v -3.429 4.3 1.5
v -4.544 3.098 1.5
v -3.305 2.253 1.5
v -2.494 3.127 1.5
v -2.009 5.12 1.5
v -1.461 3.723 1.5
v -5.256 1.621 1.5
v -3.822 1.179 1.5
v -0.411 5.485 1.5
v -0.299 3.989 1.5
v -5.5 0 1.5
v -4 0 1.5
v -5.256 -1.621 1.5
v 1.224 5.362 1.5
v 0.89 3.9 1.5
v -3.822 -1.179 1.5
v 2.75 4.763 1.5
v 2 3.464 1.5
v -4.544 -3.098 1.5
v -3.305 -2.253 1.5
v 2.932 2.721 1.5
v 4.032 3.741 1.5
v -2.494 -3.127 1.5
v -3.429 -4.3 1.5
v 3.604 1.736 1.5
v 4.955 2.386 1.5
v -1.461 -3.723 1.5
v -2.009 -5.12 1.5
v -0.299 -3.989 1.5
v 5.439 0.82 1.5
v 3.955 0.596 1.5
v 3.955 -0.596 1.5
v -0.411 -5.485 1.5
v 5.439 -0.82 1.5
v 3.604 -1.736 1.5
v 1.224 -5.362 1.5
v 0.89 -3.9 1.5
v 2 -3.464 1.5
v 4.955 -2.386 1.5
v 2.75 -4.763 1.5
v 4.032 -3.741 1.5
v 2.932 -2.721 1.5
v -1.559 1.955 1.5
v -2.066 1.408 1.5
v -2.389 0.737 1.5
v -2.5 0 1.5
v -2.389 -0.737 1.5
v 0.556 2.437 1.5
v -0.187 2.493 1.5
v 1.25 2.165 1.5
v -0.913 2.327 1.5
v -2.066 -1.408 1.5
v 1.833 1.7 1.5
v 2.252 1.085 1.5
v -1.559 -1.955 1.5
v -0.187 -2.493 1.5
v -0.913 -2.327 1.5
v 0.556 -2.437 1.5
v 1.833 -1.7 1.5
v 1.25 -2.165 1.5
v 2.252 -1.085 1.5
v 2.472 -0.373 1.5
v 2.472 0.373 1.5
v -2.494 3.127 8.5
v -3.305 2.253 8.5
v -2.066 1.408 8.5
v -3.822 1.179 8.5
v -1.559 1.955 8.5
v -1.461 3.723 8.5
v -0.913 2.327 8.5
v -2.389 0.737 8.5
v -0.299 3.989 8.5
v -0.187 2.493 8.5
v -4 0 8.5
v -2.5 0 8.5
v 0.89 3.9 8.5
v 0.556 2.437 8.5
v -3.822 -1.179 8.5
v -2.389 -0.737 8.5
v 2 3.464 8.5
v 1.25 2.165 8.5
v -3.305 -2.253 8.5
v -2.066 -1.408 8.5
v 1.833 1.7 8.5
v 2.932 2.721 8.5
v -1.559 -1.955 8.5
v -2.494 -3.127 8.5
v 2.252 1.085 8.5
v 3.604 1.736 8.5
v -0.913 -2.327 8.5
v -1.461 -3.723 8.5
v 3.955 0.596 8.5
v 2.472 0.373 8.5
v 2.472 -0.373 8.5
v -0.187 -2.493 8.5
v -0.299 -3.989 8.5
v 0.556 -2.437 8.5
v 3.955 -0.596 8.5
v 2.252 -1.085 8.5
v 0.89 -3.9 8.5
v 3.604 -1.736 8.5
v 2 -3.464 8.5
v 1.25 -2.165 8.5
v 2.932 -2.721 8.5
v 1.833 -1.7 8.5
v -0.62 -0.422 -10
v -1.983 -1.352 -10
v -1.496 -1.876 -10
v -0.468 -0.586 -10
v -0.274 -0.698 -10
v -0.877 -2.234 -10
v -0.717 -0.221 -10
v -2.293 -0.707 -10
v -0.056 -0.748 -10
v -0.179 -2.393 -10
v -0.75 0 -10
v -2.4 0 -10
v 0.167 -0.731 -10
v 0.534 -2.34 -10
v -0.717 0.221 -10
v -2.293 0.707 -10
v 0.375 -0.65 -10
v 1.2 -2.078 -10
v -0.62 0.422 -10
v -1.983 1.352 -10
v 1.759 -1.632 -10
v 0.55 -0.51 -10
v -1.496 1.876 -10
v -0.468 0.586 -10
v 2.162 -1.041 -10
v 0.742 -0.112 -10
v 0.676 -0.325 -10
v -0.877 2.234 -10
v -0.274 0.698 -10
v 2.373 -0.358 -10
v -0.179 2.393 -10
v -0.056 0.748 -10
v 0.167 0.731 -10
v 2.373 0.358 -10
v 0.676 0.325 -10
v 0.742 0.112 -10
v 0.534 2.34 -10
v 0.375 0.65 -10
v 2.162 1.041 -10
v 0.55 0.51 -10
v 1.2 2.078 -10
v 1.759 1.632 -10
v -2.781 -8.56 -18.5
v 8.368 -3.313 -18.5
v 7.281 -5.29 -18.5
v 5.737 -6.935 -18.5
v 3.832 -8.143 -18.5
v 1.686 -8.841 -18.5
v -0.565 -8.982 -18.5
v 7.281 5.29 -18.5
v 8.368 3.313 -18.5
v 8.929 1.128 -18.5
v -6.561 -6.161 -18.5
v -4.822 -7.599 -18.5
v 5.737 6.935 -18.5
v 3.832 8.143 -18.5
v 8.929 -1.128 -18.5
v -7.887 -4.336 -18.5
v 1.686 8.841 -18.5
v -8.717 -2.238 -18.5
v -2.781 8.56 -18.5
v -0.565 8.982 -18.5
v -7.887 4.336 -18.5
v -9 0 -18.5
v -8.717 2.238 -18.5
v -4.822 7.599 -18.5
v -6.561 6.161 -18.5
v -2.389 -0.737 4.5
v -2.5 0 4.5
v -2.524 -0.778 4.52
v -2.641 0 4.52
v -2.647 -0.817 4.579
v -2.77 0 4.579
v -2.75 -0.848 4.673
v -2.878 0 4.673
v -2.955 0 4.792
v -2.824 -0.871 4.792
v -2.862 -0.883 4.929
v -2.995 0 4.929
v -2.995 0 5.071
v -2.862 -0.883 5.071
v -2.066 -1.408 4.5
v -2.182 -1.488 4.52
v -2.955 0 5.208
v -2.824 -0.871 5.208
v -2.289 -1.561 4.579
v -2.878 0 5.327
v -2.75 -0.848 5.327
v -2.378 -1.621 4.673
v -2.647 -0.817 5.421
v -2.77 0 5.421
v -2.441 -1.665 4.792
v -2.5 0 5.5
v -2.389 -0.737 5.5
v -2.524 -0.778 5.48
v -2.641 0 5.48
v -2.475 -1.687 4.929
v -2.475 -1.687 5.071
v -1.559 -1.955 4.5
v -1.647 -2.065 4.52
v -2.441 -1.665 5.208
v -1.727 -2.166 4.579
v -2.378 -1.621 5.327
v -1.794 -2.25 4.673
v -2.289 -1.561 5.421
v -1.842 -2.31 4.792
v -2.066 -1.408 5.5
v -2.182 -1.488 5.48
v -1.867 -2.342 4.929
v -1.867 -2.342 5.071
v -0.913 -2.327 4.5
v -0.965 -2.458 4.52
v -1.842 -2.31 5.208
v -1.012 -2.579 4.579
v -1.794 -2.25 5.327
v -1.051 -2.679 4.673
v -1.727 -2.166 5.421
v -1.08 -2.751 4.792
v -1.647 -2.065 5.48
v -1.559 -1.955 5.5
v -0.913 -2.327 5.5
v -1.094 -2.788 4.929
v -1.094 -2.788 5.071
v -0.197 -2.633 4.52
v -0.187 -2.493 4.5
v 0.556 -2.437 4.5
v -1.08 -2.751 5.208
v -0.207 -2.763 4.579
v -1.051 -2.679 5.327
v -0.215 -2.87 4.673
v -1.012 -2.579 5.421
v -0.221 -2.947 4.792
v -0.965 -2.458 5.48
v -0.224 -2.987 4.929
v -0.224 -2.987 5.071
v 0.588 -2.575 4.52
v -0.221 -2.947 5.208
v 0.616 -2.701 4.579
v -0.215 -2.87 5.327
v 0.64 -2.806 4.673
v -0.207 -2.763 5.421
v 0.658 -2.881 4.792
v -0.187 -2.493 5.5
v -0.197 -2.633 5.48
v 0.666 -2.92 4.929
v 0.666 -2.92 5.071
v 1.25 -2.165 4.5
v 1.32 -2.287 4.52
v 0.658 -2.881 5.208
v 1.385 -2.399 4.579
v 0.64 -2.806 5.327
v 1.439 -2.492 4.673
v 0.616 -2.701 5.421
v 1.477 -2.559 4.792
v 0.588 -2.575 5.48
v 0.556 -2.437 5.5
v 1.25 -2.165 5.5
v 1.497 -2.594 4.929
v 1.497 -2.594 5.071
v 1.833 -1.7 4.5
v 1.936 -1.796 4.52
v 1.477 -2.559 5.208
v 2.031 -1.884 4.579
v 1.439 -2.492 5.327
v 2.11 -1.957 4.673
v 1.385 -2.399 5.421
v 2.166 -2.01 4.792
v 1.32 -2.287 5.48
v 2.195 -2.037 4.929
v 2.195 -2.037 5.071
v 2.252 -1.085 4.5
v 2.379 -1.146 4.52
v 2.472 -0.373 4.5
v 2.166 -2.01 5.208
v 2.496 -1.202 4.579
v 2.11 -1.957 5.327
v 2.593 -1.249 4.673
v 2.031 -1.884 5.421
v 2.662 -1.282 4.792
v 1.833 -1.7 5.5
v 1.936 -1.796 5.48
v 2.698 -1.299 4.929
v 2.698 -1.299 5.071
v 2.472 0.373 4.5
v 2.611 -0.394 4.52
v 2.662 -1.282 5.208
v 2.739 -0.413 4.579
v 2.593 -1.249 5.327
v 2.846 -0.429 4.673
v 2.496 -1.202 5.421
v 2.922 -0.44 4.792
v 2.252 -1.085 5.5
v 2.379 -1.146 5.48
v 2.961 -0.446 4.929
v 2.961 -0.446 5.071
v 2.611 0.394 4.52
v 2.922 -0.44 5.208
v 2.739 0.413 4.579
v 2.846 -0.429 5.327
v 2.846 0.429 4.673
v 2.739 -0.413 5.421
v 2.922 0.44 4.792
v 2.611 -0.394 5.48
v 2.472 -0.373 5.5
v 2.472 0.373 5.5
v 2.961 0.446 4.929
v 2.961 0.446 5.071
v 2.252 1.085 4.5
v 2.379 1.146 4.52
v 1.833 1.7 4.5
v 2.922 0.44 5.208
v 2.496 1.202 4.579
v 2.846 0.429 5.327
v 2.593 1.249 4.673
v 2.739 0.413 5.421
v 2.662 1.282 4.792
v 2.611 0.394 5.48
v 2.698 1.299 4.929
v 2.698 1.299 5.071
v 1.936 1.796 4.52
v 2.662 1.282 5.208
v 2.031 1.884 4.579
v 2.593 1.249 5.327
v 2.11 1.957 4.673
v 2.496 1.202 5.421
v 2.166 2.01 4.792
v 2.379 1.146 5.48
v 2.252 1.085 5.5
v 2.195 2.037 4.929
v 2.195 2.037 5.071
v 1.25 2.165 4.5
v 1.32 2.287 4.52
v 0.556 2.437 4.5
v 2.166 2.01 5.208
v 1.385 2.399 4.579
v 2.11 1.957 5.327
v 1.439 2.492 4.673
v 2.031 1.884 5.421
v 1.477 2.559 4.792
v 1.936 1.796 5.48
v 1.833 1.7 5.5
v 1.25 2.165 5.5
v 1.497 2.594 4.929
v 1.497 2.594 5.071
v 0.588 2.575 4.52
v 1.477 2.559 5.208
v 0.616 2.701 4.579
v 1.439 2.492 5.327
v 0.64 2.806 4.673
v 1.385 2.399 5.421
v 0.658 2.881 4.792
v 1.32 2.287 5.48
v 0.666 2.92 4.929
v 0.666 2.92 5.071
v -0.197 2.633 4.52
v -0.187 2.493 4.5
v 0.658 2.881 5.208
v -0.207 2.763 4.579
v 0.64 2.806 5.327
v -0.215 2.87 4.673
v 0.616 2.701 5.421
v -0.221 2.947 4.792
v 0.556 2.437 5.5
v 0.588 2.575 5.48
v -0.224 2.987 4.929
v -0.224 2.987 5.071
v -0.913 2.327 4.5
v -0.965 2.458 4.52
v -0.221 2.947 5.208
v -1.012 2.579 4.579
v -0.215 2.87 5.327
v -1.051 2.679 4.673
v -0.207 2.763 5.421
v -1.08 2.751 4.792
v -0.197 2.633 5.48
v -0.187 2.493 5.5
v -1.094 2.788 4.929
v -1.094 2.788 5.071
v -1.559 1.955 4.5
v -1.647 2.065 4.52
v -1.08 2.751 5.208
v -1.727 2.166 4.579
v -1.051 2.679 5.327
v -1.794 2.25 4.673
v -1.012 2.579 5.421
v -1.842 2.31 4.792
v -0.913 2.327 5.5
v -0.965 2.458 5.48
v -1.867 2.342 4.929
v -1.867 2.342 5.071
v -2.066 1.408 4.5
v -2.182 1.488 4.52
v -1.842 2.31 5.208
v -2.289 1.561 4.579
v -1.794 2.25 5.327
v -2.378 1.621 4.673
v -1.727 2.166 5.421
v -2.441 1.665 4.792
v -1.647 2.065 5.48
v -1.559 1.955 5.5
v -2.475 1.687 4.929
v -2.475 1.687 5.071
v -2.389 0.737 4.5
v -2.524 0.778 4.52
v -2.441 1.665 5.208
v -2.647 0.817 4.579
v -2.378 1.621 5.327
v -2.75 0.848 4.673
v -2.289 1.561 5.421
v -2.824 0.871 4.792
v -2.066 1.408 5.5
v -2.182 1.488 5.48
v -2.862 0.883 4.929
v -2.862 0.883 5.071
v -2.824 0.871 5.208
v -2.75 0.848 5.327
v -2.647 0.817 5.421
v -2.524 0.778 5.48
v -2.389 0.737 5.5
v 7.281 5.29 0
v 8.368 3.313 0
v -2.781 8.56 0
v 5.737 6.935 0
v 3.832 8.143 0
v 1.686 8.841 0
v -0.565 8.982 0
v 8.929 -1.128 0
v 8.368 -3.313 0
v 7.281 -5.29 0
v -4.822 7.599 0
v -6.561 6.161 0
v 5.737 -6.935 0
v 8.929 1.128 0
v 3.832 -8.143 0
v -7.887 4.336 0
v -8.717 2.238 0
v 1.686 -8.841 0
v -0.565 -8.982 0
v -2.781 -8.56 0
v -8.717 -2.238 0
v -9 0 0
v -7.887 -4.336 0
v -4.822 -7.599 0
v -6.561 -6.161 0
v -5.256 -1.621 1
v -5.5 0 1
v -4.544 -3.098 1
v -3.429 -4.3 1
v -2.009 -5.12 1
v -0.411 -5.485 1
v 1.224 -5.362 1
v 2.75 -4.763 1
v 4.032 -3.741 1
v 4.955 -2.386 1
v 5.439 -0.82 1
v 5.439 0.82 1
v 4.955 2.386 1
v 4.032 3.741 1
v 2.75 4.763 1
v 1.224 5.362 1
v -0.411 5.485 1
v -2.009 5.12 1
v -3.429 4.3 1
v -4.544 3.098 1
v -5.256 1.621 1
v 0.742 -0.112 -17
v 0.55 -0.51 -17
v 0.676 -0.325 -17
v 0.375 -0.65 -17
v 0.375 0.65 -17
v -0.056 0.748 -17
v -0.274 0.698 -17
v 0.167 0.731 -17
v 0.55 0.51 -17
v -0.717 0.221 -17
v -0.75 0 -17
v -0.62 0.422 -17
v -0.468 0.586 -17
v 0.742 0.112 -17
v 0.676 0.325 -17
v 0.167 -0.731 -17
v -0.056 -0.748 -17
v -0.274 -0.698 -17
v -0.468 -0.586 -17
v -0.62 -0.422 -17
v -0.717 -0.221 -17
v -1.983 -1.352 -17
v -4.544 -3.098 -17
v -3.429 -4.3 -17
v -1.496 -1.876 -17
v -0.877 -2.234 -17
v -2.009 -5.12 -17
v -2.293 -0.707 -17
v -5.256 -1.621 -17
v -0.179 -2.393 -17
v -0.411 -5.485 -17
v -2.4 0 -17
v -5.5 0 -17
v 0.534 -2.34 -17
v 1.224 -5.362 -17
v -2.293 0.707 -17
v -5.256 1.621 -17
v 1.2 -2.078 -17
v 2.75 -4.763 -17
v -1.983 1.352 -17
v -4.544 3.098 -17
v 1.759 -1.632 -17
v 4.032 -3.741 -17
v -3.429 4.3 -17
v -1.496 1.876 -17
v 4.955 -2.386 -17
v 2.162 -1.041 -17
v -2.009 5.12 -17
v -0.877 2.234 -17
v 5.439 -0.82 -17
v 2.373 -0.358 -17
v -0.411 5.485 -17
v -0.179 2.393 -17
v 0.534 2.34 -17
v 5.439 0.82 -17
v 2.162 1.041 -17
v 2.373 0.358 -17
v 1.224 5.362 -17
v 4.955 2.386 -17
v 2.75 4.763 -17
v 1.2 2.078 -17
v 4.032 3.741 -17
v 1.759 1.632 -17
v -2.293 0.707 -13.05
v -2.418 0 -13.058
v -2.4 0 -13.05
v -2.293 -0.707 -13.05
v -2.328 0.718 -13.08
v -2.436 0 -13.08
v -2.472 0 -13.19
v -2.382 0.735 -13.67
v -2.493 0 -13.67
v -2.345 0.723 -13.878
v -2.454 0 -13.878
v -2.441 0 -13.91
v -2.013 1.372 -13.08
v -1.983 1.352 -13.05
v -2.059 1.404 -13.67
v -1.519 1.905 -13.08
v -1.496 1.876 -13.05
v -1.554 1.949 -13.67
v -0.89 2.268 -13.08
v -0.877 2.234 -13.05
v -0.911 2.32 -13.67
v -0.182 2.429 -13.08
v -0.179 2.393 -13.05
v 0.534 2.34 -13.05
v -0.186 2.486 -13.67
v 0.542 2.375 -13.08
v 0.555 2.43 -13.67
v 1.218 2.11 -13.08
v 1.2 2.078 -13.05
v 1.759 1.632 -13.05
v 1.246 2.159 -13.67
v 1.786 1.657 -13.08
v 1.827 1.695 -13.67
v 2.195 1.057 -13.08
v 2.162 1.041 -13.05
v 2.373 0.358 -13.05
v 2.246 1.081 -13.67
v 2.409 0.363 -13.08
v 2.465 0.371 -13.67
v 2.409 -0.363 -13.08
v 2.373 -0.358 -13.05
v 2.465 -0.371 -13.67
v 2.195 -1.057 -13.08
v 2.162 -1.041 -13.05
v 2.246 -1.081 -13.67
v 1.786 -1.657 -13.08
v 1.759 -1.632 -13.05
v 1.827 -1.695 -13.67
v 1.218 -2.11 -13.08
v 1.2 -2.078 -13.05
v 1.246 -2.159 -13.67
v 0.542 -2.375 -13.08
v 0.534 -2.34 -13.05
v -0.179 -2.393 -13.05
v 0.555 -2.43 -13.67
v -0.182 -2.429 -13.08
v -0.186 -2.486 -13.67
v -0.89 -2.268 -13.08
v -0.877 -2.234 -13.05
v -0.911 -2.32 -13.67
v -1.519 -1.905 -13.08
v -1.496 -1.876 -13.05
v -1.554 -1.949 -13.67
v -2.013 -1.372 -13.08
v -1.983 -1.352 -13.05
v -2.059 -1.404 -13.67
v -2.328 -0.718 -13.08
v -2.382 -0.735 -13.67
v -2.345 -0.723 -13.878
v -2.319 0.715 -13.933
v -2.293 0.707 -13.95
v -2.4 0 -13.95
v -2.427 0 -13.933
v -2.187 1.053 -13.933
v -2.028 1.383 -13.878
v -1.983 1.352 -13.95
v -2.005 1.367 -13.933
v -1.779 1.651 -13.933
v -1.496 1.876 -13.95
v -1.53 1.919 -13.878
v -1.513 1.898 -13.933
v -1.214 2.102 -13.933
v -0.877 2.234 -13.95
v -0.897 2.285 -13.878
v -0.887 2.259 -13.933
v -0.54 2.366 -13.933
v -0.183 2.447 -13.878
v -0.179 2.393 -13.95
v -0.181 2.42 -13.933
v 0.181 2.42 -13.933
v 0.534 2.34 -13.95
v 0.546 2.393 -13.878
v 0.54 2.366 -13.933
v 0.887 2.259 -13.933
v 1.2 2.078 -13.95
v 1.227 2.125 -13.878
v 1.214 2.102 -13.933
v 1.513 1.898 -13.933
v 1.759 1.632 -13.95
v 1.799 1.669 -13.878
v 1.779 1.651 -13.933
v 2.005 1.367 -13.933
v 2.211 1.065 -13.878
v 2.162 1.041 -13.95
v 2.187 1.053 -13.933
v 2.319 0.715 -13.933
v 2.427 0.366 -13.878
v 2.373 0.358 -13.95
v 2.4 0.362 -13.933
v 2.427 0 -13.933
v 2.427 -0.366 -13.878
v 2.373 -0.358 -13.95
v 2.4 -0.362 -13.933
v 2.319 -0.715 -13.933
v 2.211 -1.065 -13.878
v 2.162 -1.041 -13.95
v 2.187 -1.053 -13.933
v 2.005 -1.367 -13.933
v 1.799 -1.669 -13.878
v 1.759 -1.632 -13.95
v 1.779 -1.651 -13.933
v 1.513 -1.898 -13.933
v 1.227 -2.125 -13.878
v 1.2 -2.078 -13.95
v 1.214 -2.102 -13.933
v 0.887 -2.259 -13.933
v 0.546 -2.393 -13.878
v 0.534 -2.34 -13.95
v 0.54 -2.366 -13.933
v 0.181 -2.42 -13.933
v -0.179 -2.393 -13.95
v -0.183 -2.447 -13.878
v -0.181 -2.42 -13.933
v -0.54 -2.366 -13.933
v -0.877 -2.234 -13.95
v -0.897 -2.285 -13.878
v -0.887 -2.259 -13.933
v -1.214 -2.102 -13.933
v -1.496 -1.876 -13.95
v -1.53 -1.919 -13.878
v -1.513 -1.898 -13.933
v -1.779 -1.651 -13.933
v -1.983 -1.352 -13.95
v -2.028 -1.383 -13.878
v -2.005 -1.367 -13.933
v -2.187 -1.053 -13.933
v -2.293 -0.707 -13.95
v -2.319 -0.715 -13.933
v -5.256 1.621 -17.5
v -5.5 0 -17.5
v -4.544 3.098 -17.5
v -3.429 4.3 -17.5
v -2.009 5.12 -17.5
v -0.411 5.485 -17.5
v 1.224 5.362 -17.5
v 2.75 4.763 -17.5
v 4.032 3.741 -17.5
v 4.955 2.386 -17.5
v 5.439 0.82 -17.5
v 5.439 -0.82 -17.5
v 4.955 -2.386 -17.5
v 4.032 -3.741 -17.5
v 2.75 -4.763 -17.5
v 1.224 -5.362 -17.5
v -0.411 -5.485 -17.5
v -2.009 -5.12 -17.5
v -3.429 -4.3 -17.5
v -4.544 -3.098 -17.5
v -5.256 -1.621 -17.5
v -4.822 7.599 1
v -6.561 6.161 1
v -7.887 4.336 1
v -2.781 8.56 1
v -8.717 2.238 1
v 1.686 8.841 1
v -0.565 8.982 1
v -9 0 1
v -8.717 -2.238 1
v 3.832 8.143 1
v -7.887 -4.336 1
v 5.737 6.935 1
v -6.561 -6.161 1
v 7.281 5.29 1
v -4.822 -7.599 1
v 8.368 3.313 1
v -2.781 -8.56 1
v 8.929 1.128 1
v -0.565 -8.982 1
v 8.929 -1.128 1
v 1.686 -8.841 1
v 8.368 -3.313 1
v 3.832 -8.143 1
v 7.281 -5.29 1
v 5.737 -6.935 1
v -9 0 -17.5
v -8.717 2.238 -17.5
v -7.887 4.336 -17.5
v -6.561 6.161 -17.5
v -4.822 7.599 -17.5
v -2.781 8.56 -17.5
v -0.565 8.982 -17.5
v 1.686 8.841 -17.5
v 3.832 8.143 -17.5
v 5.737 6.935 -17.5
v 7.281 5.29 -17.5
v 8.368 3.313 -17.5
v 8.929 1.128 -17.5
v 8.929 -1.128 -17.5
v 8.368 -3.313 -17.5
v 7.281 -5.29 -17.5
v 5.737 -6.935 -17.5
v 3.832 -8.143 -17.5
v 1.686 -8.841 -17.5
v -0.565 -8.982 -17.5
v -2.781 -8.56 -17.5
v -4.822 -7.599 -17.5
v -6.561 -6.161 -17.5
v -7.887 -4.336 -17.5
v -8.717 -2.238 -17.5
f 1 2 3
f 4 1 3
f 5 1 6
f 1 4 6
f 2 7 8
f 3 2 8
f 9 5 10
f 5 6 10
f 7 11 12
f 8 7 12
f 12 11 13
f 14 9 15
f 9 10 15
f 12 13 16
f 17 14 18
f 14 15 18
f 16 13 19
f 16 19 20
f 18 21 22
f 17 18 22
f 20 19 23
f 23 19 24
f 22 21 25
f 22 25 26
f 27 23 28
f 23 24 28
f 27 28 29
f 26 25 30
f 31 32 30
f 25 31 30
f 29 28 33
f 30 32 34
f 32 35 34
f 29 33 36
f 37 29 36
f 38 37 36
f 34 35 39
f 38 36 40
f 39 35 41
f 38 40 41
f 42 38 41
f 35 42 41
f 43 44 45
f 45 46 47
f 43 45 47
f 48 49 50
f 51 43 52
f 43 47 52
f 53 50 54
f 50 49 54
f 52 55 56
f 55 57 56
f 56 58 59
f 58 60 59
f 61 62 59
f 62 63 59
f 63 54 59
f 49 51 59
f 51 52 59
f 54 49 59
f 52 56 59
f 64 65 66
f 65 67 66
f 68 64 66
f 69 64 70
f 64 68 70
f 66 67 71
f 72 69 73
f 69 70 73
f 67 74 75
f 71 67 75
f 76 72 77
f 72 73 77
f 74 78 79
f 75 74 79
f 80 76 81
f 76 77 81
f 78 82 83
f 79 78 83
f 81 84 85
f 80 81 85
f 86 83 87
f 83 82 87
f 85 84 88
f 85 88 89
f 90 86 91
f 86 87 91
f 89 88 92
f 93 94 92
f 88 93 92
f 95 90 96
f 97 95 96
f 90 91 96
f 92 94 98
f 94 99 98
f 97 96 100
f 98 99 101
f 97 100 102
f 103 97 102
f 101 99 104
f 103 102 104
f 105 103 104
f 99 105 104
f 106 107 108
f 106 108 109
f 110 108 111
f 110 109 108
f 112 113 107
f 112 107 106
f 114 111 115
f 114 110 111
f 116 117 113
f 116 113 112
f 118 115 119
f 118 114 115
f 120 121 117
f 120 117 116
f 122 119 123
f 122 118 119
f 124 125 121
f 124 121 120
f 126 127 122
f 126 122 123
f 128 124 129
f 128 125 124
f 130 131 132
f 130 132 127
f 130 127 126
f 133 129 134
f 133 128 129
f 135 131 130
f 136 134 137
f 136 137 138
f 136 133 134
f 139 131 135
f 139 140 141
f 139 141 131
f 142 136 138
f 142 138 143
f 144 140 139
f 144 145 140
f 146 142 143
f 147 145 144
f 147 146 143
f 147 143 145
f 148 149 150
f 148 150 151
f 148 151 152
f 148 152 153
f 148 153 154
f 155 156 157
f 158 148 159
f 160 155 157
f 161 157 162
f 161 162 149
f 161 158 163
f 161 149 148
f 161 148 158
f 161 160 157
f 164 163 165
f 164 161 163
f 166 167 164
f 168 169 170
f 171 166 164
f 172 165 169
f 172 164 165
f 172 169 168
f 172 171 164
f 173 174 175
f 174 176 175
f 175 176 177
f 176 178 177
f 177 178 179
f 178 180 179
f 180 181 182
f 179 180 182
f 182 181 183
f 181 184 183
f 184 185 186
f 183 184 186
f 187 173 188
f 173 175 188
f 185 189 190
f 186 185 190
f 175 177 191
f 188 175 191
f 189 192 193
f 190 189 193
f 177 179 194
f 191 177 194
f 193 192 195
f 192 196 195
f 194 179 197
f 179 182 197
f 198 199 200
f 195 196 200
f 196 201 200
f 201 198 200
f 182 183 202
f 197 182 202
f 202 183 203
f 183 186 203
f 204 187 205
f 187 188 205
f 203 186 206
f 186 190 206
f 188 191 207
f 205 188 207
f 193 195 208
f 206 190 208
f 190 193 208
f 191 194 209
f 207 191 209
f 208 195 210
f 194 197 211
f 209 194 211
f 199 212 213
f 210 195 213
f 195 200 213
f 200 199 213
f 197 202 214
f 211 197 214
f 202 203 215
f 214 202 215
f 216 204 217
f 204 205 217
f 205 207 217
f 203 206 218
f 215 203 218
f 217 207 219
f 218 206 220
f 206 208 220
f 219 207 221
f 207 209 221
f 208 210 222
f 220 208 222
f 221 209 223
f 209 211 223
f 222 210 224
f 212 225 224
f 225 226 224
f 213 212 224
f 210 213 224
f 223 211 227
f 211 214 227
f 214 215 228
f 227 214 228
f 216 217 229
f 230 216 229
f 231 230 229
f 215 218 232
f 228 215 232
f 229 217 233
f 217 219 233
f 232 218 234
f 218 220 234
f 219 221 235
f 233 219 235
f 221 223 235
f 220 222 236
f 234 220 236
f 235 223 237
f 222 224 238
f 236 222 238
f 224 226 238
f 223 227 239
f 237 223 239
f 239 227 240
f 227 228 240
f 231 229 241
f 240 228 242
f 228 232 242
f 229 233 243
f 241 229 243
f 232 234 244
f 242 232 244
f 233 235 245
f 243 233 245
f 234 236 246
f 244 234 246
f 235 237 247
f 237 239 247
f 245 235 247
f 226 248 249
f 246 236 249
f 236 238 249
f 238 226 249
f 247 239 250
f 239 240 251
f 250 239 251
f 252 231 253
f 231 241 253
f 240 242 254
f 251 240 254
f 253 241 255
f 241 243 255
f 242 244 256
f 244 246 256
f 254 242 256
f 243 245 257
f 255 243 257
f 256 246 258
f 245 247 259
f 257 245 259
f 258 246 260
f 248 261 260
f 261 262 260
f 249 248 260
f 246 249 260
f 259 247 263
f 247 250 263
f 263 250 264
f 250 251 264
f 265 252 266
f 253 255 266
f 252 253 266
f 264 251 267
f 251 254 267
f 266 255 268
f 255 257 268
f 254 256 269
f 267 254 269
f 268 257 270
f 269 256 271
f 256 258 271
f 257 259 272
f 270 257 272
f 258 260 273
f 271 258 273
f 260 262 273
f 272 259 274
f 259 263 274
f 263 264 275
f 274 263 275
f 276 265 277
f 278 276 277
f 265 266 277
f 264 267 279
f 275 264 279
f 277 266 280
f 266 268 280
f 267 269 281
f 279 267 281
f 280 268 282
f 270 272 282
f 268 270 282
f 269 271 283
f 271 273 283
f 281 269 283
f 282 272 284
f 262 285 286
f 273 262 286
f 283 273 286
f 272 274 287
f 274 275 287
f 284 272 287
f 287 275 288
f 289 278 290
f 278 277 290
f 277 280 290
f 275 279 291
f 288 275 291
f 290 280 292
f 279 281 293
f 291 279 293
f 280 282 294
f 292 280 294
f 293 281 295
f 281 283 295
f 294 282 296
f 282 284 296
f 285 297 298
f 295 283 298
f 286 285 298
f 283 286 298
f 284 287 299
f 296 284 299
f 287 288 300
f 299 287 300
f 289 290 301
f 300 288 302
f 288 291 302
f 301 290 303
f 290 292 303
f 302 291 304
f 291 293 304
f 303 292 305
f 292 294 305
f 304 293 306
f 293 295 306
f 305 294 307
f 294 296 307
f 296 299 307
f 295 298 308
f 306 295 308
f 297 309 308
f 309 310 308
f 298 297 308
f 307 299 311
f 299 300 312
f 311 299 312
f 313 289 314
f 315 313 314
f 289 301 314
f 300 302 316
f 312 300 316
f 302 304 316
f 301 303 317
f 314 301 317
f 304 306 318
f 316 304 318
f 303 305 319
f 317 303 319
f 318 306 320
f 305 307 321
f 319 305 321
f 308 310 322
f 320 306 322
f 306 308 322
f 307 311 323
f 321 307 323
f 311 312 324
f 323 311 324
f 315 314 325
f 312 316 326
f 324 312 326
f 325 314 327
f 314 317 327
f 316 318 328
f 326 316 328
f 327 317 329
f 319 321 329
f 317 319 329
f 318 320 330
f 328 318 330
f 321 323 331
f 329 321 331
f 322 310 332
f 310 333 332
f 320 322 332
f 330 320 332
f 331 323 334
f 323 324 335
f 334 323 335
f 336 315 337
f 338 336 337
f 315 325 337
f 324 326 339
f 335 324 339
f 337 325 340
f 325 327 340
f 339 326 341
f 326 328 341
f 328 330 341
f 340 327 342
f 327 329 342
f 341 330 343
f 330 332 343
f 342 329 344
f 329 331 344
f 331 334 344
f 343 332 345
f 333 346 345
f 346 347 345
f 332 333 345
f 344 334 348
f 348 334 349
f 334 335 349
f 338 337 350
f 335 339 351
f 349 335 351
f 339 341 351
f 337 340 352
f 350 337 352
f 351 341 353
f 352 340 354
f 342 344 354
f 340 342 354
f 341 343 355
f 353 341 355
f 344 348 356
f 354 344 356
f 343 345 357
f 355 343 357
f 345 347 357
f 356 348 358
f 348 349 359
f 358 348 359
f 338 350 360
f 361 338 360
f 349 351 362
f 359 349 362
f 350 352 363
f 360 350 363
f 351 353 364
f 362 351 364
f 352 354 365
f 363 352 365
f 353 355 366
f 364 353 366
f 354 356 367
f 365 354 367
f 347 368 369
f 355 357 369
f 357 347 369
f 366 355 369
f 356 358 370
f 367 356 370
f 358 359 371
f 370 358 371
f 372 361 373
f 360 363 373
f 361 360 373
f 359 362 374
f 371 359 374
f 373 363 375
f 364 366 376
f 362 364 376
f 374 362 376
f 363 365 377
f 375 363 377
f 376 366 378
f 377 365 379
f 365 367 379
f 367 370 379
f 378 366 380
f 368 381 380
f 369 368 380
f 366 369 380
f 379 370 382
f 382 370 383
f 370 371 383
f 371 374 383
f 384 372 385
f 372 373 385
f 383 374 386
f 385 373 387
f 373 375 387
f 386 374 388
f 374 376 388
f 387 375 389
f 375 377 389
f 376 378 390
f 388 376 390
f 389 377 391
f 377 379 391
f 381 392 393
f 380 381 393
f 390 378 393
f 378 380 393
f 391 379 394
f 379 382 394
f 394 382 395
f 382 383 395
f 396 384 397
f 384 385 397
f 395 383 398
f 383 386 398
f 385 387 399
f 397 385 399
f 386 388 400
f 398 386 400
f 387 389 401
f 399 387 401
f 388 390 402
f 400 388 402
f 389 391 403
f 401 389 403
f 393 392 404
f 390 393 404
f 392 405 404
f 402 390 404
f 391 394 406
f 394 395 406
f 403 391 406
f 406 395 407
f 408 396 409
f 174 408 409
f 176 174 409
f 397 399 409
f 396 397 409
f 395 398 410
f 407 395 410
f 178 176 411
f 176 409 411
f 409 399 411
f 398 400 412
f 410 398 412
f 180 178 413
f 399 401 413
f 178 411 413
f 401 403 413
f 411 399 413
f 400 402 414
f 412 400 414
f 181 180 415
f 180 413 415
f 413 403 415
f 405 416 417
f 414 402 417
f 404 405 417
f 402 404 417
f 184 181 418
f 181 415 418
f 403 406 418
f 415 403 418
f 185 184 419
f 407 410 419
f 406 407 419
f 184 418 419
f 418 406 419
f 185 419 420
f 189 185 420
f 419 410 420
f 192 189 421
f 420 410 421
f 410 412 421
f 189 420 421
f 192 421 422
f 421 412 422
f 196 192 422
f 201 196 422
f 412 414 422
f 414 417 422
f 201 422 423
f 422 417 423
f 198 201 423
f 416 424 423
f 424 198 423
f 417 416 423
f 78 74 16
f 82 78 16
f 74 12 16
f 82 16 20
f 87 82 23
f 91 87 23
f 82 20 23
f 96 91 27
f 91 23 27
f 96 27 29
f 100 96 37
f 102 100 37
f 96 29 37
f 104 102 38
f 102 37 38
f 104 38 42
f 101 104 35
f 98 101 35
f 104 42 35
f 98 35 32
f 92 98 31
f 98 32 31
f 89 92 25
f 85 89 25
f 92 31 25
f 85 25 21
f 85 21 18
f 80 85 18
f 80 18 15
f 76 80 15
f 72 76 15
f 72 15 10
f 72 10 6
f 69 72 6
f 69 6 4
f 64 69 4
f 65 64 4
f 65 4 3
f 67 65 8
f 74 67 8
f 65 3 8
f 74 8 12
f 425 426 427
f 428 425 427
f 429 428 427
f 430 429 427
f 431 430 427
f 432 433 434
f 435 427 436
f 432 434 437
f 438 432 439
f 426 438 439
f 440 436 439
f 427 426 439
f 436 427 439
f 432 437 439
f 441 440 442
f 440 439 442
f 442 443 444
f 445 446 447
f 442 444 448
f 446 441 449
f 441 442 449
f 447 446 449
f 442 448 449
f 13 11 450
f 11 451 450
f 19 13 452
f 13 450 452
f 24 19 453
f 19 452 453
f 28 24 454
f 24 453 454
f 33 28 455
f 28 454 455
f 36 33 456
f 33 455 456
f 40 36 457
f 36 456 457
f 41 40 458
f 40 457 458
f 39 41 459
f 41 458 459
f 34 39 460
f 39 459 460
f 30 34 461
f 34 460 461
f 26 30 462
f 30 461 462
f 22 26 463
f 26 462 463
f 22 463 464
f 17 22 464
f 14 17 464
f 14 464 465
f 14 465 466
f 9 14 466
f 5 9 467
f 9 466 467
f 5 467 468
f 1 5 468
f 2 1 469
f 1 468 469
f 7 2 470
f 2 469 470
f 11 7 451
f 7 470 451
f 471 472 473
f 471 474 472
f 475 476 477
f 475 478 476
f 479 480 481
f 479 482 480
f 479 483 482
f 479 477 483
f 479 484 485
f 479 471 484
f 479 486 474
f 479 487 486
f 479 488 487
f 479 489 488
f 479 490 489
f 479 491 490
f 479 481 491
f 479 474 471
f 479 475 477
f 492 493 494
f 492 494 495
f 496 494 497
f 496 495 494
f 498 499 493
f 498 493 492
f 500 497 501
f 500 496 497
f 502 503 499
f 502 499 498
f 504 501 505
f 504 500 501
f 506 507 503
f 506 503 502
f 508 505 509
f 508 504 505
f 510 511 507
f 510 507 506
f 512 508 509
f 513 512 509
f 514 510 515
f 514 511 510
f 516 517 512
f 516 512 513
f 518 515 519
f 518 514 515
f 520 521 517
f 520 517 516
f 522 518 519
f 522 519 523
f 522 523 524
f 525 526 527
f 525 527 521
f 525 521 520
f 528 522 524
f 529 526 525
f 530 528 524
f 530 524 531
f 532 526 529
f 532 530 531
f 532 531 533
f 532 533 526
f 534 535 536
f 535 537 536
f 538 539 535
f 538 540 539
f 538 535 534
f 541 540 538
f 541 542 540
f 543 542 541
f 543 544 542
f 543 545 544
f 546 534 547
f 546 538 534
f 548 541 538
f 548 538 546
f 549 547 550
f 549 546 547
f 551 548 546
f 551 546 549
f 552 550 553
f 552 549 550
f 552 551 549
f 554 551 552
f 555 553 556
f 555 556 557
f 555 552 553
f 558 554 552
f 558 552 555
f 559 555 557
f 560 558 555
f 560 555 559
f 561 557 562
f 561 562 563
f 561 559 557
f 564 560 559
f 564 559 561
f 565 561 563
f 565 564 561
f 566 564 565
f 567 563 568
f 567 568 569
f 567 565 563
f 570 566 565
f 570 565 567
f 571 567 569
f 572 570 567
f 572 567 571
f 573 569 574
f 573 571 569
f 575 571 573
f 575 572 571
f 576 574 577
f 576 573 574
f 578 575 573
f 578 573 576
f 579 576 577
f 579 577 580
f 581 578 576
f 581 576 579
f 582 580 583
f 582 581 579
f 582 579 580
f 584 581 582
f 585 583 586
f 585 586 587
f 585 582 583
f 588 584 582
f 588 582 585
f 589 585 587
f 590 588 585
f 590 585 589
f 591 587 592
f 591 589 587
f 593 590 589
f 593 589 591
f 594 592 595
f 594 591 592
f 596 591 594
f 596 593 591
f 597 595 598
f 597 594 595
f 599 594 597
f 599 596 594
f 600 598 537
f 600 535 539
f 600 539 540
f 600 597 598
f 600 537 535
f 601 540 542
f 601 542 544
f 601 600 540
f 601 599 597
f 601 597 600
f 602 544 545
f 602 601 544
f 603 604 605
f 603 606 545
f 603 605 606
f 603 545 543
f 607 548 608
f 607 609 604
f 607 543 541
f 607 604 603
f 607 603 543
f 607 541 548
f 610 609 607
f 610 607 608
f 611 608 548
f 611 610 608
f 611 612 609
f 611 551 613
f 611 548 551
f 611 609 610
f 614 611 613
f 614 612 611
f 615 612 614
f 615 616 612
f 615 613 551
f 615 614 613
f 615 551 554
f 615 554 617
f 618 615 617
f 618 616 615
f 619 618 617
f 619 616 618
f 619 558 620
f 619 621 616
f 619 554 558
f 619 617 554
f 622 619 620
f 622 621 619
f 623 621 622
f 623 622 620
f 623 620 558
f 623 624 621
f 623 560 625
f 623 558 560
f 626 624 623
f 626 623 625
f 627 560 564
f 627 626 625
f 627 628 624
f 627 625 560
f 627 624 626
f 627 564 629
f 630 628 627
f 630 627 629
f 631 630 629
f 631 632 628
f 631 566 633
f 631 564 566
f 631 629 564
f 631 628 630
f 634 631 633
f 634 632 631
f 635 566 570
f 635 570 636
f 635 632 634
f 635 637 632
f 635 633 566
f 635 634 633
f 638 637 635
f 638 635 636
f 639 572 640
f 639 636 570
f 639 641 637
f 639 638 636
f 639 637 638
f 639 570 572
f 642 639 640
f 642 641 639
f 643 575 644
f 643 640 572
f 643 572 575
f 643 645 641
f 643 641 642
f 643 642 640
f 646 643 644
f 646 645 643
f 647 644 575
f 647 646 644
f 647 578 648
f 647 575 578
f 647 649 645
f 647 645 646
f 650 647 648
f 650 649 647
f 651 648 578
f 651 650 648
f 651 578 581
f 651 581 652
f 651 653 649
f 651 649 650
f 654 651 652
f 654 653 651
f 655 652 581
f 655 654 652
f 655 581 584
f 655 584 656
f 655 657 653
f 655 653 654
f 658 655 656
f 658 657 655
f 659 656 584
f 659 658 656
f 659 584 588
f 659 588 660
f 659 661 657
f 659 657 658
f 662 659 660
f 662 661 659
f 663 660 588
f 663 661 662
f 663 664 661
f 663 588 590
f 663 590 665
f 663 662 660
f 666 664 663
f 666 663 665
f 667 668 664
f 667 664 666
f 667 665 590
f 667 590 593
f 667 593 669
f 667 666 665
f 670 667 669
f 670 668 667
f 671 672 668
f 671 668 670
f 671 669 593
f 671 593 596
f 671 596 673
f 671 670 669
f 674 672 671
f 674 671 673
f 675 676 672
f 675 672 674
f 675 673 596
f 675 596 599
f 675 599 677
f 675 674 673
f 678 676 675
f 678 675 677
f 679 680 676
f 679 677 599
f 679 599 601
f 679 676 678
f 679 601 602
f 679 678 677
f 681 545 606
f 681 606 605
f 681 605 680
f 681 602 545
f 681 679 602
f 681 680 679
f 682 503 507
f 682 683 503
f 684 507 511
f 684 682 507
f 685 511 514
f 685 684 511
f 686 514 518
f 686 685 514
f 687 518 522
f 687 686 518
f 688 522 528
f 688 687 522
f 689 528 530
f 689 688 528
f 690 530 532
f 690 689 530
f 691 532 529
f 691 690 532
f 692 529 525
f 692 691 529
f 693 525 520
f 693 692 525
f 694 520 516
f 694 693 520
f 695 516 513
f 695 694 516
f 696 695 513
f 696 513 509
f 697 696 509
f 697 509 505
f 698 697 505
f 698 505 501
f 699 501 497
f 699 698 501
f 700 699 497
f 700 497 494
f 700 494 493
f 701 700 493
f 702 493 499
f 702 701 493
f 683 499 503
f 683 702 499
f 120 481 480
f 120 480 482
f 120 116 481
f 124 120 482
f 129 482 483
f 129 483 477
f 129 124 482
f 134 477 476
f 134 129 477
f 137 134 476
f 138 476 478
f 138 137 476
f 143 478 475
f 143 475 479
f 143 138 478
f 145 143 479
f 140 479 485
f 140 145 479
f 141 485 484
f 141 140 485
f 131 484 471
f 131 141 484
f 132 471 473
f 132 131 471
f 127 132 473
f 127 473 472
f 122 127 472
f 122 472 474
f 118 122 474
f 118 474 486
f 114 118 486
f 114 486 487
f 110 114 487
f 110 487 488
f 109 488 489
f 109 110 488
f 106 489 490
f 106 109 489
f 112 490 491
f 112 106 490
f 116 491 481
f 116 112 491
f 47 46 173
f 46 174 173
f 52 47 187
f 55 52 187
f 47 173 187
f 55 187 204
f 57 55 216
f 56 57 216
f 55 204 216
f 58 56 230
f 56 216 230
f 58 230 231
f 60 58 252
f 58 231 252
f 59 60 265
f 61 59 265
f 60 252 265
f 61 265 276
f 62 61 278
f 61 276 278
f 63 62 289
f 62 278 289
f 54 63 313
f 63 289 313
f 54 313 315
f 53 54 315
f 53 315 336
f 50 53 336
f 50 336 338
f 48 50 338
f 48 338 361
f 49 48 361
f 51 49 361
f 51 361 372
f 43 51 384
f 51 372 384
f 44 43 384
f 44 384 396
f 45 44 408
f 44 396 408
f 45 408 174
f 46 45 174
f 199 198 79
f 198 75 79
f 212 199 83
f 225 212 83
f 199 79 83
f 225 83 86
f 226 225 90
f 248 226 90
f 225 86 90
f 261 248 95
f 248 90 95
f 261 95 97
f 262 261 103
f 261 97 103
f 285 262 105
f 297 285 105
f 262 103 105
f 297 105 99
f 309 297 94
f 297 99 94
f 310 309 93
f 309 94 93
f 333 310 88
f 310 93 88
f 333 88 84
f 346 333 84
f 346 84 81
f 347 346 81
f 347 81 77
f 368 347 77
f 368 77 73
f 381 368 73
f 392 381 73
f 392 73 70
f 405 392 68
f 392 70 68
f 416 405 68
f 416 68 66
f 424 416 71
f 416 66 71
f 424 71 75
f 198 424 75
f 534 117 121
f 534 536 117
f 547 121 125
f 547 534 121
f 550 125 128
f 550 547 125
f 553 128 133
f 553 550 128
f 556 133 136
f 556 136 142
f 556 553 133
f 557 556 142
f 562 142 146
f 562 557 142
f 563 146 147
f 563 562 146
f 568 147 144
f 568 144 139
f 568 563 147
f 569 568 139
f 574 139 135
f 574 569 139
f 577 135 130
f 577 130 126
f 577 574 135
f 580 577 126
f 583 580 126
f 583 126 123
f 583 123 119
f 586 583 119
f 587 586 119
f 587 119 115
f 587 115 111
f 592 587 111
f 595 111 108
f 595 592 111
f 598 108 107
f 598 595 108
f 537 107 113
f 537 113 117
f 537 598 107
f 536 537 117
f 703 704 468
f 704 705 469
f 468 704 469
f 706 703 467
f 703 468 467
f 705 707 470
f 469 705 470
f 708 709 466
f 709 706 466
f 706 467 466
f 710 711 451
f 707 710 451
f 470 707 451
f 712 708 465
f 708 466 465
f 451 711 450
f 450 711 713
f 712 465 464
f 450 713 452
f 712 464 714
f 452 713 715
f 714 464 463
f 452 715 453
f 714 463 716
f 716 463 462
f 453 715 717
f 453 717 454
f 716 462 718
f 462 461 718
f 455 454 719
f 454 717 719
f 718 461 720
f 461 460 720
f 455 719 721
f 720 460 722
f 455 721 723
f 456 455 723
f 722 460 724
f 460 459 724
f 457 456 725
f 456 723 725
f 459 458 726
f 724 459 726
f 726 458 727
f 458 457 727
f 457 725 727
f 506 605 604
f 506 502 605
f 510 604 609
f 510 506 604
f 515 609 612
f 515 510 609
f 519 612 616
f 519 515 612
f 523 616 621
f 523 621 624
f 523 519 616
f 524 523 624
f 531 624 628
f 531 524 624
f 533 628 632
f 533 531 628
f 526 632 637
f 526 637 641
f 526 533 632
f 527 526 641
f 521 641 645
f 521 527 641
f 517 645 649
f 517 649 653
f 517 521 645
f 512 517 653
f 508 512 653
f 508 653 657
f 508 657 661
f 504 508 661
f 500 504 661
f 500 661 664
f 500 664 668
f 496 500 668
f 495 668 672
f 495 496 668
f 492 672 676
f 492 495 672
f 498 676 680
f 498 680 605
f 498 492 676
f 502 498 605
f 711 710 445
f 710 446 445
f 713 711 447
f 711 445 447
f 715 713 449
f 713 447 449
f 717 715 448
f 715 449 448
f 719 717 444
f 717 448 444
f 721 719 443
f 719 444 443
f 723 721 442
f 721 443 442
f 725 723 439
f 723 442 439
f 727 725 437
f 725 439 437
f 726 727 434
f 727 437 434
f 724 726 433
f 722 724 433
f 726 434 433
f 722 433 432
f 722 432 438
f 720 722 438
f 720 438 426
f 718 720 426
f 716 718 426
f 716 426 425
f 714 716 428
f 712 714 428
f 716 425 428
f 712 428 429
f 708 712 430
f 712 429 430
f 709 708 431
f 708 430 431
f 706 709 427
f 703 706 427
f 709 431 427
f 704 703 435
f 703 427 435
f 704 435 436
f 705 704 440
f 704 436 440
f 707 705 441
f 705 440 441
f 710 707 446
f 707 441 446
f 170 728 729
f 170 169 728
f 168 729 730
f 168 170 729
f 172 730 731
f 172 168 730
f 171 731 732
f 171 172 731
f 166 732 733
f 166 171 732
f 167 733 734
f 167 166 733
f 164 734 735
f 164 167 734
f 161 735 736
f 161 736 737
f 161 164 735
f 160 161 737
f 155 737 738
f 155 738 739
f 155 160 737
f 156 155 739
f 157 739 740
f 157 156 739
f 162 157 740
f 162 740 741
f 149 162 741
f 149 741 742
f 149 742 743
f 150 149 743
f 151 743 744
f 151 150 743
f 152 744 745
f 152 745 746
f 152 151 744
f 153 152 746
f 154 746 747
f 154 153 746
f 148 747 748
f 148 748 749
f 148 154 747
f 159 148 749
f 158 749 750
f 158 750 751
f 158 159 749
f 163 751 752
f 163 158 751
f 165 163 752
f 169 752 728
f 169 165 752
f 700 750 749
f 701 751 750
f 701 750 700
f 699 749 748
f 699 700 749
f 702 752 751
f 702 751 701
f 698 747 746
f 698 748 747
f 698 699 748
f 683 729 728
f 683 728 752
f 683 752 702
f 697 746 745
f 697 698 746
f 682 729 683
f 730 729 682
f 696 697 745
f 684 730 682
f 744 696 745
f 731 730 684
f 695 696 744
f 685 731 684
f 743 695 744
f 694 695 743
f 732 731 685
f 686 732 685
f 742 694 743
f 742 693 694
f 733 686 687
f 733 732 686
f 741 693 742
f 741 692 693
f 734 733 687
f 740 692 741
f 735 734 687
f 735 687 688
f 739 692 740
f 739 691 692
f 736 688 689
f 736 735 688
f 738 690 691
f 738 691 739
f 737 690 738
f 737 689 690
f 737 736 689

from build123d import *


with BuildPart() as f1:
    # F0 (on Front) → F1 (revolve)
    with BuildSketch(Plane.XZ):
        with BuildLine():
            Line((-9, 0), (0, 0))
            Line((0, 0), (0, 1.5))
            Line((0, 1.5), (-2.5, 1.5))
            Line((-2.5, 1.5), (-2.5, 4.5))
            ThreePointArc((-2.5, 4.5), (-3, 5), (-2.5, 5.5))
            Line((-2.5, 5.5), (-2.5, 8.5))
            Line((-2.5, 8.5), (-4, 8.5))
            Line((-4, 8.5), (-4, 1.5))
            Line((-4, 1.5), (-5.5, 1.5))
            Line((-5.5, 1.5), (-5.5, 1))
            Line((-5.5, 1), (-9, 1))
            Line((-9, 1), (-9, 0))
        make_face()
    revolve(axis=Axis((0, 0, 0.75), (0, 0, 1)))


with BuildPart() as f2:
    # F0 (on Front) → F2 (revolve)
    with BuildSketch(Plane.XZ):
        with BuildLine():
            Line((-9, -18.5), (0, -18.5))
            Line((0, -18.5), (0, -17))
            Line((0, -17), (-0.75, -17))
            Line((-0.75, -17), (-0.75, -10))
            Line((-0.75, -10), (-2.4, -10))
            Line((-2.4, -10), (-2.4, -13.05))
            add(Edge.make_bspline(
                [(-2.4, -13.05), (-2.5, -13.05), (-2.5, -13.5), (-2.5, -13.95), (-2.4, -13.95)],
                knots=[3.1415926536, 3.1415926536, 3.1415926536, 4.7123889804, 4.7123889804, 6.2831853072, 6.2831853072, 6.2831853072], degree=2, weights=[1, 0.7071067812, 1, 0.7071067812, 1]))
            Line((-2.4, -13.95), (-2.4, -17))
            Line((-2.4, -17), (-5.5, -17))
            Line((-5.5, -17), (-5.5, -17.5))
            Line((-5.5, -17.5), (-9, -17.5))
            Line((-9, -17.5), (-9, -18.5))
        make_face()
    revolve(axis=Axis((0, 0, -17.75), (0, 0, -1)))


solid = Compound([f1.part, f2.part])
